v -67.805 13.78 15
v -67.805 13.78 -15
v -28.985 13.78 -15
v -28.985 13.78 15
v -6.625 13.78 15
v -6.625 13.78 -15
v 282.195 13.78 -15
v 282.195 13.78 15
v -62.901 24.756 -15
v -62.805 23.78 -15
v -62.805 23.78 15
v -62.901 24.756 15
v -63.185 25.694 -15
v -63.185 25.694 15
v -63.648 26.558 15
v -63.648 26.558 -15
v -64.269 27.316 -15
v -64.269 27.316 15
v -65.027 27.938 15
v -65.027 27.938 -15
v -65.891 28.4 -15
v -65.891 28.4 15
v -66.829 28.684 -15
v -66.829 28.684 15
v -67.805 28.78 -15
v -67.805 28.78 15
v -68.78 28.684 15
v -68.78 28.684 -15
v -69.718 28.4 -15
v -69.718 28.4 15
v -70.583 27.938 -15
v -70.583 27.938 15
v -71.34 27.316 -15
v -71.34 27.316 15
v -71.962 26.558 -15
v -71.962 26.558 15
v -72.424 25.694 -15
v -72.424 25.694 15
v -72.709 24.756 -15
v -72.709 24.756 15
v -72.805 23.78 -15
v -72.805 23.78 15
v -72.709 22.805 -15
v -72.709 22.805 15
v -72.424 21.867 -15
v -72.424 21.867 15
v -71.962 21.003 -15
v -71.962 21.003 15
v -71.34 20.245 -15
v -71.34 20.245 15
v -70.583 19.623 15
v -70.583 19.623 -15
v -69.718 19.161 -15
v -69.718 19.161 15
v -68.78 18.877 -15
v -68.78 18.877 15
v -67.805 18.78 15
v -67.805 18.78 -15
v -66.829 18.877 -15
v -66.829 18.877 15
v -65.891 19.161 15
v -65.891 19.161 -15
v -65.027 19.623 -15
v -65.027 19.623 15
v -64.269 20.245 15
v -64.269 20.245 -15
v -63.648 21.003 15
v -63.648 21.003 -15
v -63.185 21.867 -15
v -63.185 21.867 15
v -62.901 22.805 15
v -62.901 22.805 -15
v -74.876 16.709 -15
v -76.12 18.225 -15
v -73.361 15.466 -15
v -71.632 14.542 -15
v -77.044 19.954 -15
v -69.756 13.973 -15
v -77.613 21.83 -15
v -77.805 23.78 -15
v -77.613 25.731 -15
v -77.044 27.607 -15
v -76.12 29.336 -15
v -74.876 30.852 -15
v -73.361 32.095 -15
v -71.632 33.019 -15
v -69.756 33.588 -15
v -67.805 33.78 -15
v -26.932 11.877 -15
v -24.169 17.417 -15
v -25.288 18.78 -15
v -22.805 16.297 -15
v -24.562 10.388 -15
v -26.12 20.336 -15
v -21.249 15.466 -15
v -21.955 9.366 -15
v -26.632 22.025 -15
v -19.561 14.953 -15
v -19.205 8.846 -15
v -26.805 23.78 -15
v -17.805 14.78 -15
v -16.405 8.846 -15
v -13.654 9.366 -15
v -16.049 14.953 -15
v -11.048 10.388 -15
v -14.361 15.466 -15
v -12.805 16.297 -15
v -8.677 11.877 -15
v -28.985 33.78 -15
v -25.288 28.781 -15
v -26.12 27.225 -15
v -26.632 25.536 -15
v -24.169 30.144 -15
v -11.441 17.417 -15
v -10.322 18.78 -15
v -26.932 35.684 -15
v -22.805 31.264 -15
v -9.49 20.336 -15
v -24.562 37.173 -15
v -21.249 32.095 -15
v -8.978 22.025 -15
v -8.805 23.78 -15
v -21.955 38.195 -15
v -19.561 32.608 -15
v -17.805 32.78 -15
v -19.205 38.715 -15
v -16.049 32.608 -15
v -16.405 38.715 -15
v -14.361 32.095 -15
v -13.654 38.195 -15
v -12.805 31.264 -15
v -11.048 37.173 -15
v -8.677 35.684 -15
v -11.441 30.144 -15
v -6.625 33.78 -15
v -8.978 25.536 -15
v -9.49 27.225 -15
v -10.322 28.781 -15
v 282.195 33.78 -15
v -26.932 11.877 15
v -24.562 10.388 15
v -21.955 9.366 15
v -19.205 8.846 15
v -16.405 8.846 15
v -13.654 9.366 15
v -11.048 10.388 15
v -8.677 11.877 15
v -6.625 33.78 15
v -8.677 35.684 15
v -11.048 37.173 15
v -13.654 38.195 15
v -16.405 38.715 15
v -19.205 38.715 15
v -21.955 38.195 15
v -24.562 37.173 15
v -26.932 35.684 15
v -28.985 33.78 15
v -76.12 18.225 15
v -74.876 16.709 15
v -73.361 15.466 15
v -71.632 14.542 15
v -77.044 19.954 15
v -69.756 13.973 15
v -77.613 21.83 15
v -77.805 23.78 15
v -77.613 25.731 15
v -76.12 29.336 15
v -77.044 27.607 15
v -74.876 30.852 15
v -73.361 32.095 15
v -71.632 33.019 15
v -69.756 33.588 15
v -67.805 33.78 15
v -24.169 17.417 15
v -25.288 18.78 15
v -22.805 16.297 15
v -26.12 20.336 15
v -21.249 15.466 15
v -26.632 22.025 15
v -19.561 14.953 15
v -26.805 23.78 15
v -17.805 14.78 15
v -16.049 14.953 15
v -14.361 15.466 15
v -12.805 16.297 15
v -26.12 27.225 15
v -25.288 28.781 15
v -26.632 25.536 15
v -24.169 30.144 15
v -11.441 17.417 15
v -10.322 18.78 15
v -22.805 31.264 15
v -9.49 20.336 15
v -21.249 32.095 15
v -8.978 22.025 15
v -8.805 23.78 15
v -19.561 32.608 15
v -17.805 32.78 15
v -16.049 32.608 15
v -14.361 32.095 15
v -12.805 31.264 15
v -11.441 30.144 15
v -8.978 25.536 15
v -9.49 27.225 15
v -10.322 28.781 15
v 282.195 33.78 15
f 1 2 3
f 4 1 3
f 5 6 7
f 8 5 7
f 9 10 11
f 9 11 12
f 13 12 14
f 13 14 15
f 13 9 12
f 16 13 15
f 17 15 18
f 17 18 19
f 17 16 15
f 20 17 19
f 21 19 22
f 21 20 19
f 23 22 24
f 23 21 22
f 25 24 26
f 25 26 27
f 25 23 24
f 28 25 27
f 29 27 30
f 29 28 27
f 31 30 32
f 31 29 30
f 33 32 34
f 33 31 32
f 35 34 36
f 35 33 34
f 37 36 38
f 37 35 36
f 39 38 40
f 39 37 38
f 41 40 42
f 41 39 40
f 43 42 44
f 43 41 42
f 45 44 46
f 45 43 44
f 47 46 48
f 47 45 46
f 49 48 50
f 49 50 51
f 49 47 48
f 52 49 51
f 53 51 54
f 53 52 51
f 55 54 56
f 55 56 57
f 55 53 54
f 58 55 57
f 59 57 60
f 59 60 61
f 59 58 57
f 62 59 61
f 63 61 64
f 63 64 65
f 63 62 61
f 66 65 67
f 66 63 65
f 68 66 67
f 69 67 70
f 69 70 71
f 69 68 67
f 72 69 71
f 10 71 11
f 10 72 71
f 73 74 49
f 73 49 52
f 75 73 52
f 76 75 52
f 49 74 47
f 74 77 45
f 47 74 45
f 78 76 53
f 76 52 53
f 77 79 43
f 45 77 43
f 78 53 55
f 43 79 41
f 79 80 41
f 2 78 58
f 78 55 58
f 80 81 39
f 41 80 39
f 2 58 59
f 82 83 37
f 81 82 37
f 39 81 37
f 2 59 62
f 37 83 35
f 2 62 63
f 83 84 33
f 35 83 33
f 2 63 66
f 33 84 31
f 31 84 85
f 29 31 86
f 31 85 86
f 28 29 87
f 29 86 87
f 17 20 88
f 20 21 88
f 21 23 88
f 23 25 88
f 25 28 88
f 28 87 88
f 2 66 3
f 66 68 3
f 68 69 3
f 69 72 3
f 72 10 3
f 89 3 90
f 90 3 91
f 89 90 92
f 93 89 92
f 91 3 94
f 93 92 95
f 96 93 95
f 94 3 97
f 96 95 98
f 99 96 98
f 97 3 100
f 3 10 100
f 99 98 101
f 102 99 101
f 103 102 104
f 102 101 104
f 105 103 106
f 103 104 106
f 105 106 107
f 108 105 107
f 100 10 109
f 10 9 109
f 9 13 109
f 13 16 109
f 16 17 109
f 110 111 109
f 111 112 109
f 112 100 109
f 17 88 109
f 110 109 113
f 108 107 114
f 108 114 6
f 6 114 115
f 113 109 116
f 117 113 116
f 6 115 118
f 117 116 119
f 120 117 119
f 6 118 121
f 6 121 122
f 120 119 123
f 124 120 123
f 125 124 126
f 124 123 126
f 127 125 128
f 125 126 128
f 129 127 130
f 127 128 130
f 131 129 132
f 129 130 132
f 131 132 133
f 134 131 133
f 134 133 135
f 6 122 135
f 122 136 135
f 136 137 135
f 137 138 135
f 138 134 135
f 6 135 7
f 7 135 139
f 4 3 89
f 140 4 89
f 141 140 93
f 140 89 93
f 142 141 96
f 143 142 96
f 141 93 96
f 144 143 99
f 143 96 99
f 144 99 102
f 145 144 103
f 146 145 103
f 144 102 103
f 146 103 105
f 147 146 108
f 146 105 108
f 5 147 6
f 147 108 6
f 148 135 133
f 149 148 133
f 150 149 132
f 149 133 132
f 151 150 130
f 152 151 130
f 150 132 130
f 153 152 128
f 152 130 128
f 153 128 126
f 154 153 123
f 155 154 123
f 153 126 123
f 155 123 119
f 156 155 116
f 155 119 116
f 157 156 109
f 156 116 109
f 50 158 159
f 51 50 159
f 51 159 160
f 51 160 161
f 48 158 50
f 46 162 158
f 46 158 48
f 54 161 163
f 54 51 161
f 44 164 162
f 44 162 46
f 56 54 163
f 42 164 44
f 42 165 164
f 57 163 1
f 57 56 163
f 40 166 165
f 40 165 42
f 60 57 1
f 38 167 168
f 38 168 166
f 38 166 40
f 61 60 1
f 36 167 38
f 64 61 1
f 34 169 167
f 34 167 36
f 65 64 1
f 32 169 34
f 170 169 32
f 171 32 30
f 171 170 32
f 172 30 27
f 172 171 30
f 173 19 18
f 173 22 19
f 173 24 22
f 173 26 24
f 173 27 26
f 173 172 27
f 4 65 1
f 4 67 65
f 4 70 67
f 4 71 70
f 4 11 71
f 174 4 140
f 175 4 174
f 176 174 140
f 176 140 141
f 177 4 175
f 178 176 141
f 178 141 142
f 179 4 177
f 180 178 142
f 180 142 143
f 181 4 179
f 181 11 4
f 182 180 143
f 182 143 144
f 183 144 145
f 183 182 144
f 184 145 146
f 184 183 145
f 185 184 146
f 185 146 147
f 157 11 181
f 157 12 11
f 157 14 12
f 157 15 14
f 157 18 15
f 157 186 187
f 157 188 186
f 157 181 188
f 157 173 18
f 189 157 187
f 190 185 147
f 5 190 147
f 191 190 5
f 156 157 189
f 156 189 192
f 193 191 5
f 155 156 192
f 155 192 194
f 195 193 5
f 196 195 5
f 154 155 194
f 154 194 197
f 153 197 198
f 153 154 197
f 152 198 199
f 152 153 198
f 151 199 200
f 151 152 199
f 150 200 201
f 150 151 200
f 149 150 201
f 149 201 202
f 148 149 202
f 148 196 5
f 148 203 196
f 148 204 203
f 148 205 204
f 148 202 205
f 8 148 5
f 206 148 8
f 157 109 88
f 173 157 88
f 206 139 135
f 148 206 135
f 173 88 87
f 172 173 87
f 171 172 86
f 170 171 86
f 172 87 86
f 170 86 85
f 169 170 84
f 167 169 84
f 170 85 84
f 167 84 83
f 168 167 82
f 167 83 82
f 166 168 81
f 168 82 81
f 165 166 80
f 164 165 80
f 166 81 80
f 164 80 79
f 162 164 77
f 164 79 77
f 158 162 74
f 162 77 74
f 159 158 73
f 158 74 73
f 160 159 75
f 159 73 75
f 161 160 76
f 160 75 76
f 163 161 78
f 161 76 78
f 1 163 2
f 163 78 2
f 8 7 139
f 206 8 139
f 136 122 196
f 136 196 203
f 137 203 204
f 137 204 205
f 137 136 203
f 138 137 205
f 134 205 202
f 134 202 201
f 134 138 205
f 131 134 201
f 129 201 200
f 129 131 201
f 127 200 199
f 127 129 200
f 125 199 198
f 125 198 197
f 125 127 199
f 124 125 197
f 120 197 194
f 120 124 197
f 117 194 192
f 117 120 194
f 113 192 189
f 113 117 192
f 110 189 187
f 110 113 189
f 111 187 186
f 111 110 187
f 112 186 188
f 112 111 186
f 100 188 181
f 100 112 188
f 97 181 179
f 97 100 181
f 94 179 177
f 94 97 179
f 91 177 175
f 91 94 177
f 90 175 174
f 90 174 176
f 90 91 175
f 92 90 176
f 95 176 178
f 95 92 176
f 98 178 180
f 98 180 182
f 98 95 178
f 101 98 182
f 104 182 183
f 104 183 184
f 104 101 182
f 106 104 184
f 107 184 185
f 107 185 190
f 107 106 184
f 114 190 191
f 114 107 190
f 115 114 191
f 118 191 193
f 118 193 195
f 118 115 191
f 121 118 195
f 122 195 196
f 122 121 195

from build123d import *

# Parameters (mm, degrees)
BOSS_EXTRUDE1_DEPTH      = 15
BOSS_EXTRUDE1_DEPTH_BACK = 15
SKETCH1_R                = 9
SKETCH1_R_2              = 5


with BuildPart() as part:
    # Sketch1 → Boss-Extrude1 (new, two sides: drawn at the far end of the back side and taken through both)
    with BuildSketch(Plane.XY.offset(-BOSS_EXTRUDE1_DEPTH_BACK)):
        with BuildLine():
            Line((282.195121951, 33.780487805), (-6.624538161, 33.780487805))
            ThreePointArc((-6.624538161, 33.780487805), (-17.804878049, 38.780487805), (-28.985217936, 33.780487805))
            Line((-28.985217936, 33.780487805), (-67.804878049, 33.780487805))
            ThreePointArc((-67.804878049, 33.780487805), (-77.804878049, 23.780487805), (-67.804878049, 13.780487805))
            Line((-67.804878049, 13.780487805), (-28.985217936, 13.780487805))
            ThreePointArc((-28.985217936, 13.780487805), (-17.804878049, 8.780487805), (-6.624538161, 13.780487805))
            Line((-6.624538161, 13.780487805), (282.195121951, 13.780487805))
            Line((282.195121951, 13.780487805), (282.195121951, 33.780487805))
        make_face()
        with Locations((-17.804878049, 23.780487805)):
            Circle(SKETCH1_R, mode=Mode.SUBTRACT)
        with Locations((-67.804878049, 23.780487805)):
            Circle(SKETCH1_R_2, mode=Mode.SUBTRACT)
    extrude(amount=BOSS_EXTRUDE1_DEPTH + BOSS_EXTRUDE1_DEPTH_BACK)


solid = part.part
